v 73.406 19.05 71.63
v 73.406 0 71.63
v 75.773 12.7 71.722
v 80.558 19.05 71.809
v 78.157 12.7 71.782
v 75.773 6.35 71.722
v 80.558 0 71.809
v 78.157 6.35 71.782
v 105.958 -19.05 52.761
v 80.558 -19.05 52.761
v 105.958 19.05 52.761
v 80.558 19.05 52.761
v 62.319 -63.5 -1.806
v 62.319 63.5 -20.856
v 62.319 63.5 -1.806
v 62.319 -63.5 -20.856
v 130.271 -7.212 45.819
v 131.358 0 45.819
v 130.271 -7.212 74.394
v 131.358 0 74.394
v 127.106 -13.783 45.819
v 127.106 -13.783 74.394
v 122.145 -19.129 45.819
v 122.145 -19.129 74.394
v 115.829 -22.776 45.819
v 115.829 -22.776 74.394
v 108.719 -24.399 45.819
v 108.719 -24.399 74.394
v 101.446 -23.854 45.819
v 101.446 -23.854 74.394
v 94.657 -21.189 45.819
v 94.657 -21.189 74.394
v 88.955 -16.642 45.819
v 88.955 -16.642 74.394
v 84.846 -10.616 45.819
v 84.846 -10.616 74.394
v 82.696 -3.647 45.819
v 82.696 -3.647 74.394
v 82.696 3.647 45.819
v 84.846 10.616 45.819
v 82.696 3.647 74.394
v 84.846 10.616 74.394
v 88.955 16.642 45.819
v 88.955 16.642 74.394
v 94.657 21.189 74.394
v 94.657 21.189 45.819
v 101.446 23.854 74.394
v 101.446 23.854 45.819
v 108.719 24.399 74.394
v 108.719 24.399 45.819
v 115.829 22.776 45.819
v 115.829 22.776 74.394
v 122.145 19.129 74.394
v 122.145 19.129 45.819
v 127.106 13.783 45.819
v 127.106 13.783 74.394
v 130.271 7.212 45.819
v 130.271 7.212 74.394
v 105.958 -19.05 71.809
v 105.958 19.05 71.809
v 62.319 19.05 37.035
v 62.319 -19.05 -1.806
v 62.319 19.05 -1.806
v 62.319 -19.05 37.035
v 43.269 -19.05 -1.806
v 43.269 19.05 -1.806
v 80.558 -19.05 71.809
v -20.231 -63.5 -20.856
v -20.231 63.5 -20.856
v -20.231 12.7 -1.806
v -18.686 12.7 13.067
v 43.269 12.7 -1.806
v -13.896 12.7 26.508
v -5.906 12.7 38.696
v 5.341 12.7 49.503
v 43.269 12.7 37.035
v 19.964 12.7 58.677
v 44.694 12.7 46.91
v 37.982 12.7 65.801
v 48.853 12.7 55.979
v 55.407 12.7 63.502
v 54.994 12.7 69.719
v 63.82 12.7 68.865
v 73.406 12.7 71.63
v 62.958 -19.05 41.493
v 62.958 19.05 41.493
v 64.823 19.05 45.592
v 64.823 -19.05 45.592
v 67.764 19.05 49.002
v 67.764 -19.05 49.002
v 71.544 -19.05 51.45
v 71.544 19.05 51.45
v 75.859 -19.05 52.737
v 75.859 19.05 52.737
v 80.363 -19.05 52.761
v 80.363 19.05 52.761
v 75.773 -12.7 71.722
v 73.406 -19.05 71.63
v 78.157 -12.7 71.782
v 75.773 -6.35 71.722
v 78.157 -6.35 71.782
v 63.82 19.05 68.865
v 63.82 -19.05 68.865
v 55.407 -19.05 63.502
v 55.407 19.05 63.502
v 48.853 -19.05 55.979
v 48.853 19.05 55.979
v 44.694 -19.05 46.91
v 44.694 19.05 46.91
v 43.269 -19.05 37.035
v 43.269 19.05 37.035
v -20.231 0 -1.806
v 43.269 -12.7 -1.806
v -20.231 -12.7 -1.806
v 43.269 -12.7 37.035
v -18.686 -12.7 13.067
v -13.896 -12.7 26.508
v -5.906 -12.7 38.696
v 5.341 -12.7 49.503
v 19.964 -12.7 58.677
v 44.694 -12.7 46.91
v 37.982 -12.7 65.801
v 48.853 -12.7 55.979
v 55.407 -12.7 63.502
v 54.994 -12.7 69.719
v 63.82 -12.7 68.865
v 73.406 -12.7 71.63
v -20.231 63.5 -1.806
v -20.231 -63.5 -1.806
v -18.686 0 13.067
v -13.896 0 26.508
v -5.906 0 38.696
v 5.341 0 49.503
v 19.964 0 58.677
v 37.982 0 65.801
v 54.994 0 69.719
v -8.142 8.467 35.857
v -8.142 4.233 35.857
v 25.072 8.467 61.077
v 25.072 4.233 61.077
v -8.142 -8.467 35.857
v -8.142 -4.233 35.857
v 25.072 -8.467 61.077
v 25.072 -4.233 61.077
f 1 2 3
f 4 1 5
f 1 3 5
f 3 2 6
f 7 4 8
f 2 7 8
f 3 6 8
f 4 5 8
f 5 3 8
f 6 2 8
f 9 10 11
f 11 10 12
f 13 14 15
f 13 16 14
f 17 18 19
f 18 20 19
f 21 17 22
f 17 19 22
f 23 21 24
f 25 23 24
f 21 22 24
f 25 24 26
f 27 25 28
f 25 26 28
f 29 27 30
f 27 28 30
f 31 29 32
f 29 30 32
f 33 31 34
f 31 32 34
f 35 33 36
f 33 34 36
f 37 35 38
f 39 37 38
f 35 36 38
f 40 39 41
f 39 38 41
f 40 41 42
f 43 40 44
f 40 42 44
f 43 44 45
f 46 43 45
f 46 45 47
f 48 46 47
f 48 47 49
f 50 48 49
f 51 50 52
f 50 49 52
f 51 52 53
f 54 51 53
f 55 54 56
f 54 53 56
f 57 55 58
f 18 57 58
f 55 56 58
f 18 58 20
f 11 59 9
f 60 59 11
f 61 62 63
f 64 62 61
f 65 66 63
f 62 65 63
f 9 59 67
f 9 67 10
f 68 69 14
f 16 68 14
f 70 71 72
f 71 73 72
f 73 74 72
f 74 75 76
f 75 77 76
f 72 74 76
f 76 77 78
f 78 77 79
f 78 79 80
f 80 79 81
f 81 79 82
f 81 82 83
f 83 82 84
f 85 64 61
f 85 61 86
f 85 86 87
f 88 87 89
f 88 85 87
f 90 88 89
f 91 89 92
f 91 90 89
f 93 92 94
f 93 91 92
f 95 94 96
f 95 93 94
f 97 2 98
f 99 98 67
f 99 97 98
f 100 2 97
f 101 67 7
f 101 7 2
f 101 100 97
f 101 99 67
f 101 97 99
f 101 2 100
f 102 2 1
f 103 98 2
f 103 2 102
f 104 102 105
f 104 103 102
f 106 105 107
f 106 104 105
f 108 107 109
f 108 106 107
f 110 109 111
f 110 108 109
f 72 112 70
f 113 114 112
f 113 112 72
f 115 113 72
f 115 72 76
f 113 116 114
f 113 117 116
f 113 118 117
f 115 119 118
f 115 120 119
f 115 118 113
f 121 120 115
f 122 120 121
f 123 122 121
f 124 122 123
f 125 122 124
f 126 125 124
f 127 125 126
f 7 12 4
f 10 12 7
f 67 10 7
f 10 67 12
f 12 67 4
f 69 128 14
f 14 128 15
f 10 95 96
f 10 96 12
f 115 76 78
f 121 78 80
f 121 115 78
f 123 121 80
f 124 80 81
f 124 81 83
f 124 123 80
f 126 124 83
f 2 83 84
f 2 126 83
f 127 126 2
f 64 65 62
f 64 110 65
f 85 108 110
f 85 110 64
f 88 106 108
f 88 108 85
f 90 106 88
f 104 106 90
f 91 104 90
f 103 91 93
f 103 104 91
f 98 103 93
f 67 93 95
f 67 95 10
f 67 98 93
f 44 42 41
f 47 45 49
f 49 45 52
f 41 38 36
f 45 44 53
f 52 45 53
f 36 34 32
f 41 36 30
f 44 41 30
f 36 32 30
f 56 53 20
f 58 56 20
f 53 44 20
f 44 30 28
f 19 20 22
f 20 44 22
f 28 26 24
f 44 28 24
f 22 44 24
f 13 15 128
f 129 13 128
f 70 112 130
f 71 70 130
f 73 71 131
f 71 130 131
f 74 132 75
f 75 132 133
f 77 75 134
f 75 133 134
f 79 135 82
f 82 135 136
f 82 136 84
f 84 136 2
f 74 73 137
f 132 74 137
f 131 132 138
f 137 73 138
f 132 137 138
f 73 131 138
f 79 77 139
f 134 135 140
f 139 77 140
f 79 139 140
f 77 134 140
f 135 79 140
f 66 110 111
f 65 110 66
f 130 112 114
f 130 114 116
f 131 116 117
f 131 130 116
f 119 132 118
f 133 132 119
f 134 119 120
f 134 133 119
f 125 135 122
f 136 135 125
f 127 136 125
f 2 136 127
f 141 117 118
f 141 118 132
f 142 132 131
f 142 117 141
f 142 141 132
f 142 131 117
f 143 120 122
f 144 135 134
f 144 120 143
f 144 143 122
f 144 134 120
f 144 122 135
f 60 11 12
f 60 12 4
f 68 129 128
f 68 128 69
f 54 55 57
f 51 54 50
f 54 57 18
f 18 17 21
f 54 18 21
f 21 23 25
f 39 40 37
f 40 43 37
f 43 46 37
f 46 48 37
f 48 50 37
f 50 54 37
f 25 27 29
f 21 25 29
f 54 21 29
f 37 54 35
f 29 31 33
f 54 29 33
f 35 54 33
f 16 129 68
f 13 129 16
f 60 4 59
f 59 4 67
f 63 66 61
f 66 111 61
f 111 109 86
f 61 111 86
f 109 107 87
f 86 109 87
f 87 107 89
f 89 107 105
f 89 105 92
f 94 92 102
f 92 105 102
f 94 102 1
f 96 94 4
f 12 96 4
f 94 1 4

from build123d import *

# Parameters (mm, degrees)
F1_DEPTH = 63.5
F2_DEPTH = 38.1
F3_DEPTH = 19.05
F4_DEPTH = 12.7
F6_DEPTH = 25.4


with BuildPart() as f1:
    # F0 (on Front) → F1 (new body, symmetric)
    with BuildSketch(Plane.XZ):
        Polygon((62.319098, -20.856281), (62.319098, -1.806281), (43.269098, -1.806281), (-20.230902, -1.806281), (-20.230902, -20.856281), align=None)
    extrude(amount=F1_DEPTH, both=True)

    # F0 (on Front) → F2 (cut, symmetric)
    with BuildSketch(Plane.XZ):
        with BuildLine():
            Line((80.557601, 74.393719), (80.557601, 71.879739))
            ThreePointArc((80.557601, 71.879739), (80.986412, 71.848001), (81.4148, 71.810985))
            Line((81.4148, 71.810985), (106.89038, 71.810985))
            Line((106.89038, 71.810985), (106.89038, 74.393719))
            Line((106.89038, 74.393719), (80.557601, 74.393719))
        make_face()
    extrude(amount=F2_DEPTH, both=True, mode=Mode.SUBTRACT)


with BuildPart() as f3:
    # F0 (on Front) → F3 (new body, symmetric)
    with BuildSketch(Plane.XZ):
        with BuildLine():
            Line((43.269098, -1.806281), (62.319098, -1.806281))
            Line((62.319098, -1.806281), (62.319098, 37.034805))
            ThreePointArc((62.319098, 37.034805), (67.76364, 49.00231), (80.362711, 52.760985))
            Line((80.362711, 52.760985), (80.557601, 52.760985))
            Line((80.557601, 52.760985), (80.557601, 71.809276))
            add(Edge.make_bspline(
                [(73.406428, 71.630091), (75.764734, 71.738608), (78.149213, 71.798616), (80.557601, 71.809276)],
                knots=[119.648063, 119.648063, 119.648063, 119.648063, 124.883926, 124.883926, 124.883926, 124.883926], degree=3))
            ThreePointArc((73.406428, 71.630091), (51.860042, 59.975448), (43.269098, 37.034805))
            Line((43.269098, 37.034805), (43.269098, -1.806281))
        make_face()
    extrude(amount=F3_DEPTH, both=True)


with BuildPart() as f4:
    # F0 (on Front) → F4 (new body, symmetric)
    with BuildSketch(Plane.XZ):
        with BuildLine():
            Line((-20.230902, -1.806281), (43.269098, -1.806281))
            Line((43.269098, -1.806281), (43.269098, 37.034805))
            ThreePointArc((43.269098, 37.034805), (51.860042, 59.975448), (73.406428, 71.630091))
            add(Edge.make_bspline(
                [(-20.230902, -1.806281), (-20.707842, 41.33873), (19.515271, 69.150292), (73.406428, 71.630091)],
                knots=[0, 0, 0, 0, 119.648063, 119.648063, 119.648063, 119.648063], degree=3))
        make_face()
    extrude(amount=F4_DEPTH, both=True)


with BuildPart() as f5:
    # F0 (on Front) → F5 (revolve)
    with BuildSketch(Plane.XZ):
        Polygon((106.89038, 71.810985), (106.89038, 45.818719), (131.357601, 45.818719), (131.357601, 74.393719), (106.89038, 74.393719), align=None)
    revolve(axis=Axis((106.89038, 0, 60.106219), (0, 0, -1)))


with BuildPart() as f6:
    # F3_face (on face) → F6 (new body)
    with BuildSketch(Plane(origin=(80.557601, 0, 62.28513), x_dir=(0, 1, 0), z_dir=(1, 0, 0))):
        Polygon((-19.05, -9.524145), (19.05, -9.524145), (19.05, 9.524145), (0, 9.524145), (-19.05, 9.524145), align=None)
    extrude(amount=F6_DEPTH)


solid = Compound([f1.part, f3.part, f4.part, f5.part, f6.part])
